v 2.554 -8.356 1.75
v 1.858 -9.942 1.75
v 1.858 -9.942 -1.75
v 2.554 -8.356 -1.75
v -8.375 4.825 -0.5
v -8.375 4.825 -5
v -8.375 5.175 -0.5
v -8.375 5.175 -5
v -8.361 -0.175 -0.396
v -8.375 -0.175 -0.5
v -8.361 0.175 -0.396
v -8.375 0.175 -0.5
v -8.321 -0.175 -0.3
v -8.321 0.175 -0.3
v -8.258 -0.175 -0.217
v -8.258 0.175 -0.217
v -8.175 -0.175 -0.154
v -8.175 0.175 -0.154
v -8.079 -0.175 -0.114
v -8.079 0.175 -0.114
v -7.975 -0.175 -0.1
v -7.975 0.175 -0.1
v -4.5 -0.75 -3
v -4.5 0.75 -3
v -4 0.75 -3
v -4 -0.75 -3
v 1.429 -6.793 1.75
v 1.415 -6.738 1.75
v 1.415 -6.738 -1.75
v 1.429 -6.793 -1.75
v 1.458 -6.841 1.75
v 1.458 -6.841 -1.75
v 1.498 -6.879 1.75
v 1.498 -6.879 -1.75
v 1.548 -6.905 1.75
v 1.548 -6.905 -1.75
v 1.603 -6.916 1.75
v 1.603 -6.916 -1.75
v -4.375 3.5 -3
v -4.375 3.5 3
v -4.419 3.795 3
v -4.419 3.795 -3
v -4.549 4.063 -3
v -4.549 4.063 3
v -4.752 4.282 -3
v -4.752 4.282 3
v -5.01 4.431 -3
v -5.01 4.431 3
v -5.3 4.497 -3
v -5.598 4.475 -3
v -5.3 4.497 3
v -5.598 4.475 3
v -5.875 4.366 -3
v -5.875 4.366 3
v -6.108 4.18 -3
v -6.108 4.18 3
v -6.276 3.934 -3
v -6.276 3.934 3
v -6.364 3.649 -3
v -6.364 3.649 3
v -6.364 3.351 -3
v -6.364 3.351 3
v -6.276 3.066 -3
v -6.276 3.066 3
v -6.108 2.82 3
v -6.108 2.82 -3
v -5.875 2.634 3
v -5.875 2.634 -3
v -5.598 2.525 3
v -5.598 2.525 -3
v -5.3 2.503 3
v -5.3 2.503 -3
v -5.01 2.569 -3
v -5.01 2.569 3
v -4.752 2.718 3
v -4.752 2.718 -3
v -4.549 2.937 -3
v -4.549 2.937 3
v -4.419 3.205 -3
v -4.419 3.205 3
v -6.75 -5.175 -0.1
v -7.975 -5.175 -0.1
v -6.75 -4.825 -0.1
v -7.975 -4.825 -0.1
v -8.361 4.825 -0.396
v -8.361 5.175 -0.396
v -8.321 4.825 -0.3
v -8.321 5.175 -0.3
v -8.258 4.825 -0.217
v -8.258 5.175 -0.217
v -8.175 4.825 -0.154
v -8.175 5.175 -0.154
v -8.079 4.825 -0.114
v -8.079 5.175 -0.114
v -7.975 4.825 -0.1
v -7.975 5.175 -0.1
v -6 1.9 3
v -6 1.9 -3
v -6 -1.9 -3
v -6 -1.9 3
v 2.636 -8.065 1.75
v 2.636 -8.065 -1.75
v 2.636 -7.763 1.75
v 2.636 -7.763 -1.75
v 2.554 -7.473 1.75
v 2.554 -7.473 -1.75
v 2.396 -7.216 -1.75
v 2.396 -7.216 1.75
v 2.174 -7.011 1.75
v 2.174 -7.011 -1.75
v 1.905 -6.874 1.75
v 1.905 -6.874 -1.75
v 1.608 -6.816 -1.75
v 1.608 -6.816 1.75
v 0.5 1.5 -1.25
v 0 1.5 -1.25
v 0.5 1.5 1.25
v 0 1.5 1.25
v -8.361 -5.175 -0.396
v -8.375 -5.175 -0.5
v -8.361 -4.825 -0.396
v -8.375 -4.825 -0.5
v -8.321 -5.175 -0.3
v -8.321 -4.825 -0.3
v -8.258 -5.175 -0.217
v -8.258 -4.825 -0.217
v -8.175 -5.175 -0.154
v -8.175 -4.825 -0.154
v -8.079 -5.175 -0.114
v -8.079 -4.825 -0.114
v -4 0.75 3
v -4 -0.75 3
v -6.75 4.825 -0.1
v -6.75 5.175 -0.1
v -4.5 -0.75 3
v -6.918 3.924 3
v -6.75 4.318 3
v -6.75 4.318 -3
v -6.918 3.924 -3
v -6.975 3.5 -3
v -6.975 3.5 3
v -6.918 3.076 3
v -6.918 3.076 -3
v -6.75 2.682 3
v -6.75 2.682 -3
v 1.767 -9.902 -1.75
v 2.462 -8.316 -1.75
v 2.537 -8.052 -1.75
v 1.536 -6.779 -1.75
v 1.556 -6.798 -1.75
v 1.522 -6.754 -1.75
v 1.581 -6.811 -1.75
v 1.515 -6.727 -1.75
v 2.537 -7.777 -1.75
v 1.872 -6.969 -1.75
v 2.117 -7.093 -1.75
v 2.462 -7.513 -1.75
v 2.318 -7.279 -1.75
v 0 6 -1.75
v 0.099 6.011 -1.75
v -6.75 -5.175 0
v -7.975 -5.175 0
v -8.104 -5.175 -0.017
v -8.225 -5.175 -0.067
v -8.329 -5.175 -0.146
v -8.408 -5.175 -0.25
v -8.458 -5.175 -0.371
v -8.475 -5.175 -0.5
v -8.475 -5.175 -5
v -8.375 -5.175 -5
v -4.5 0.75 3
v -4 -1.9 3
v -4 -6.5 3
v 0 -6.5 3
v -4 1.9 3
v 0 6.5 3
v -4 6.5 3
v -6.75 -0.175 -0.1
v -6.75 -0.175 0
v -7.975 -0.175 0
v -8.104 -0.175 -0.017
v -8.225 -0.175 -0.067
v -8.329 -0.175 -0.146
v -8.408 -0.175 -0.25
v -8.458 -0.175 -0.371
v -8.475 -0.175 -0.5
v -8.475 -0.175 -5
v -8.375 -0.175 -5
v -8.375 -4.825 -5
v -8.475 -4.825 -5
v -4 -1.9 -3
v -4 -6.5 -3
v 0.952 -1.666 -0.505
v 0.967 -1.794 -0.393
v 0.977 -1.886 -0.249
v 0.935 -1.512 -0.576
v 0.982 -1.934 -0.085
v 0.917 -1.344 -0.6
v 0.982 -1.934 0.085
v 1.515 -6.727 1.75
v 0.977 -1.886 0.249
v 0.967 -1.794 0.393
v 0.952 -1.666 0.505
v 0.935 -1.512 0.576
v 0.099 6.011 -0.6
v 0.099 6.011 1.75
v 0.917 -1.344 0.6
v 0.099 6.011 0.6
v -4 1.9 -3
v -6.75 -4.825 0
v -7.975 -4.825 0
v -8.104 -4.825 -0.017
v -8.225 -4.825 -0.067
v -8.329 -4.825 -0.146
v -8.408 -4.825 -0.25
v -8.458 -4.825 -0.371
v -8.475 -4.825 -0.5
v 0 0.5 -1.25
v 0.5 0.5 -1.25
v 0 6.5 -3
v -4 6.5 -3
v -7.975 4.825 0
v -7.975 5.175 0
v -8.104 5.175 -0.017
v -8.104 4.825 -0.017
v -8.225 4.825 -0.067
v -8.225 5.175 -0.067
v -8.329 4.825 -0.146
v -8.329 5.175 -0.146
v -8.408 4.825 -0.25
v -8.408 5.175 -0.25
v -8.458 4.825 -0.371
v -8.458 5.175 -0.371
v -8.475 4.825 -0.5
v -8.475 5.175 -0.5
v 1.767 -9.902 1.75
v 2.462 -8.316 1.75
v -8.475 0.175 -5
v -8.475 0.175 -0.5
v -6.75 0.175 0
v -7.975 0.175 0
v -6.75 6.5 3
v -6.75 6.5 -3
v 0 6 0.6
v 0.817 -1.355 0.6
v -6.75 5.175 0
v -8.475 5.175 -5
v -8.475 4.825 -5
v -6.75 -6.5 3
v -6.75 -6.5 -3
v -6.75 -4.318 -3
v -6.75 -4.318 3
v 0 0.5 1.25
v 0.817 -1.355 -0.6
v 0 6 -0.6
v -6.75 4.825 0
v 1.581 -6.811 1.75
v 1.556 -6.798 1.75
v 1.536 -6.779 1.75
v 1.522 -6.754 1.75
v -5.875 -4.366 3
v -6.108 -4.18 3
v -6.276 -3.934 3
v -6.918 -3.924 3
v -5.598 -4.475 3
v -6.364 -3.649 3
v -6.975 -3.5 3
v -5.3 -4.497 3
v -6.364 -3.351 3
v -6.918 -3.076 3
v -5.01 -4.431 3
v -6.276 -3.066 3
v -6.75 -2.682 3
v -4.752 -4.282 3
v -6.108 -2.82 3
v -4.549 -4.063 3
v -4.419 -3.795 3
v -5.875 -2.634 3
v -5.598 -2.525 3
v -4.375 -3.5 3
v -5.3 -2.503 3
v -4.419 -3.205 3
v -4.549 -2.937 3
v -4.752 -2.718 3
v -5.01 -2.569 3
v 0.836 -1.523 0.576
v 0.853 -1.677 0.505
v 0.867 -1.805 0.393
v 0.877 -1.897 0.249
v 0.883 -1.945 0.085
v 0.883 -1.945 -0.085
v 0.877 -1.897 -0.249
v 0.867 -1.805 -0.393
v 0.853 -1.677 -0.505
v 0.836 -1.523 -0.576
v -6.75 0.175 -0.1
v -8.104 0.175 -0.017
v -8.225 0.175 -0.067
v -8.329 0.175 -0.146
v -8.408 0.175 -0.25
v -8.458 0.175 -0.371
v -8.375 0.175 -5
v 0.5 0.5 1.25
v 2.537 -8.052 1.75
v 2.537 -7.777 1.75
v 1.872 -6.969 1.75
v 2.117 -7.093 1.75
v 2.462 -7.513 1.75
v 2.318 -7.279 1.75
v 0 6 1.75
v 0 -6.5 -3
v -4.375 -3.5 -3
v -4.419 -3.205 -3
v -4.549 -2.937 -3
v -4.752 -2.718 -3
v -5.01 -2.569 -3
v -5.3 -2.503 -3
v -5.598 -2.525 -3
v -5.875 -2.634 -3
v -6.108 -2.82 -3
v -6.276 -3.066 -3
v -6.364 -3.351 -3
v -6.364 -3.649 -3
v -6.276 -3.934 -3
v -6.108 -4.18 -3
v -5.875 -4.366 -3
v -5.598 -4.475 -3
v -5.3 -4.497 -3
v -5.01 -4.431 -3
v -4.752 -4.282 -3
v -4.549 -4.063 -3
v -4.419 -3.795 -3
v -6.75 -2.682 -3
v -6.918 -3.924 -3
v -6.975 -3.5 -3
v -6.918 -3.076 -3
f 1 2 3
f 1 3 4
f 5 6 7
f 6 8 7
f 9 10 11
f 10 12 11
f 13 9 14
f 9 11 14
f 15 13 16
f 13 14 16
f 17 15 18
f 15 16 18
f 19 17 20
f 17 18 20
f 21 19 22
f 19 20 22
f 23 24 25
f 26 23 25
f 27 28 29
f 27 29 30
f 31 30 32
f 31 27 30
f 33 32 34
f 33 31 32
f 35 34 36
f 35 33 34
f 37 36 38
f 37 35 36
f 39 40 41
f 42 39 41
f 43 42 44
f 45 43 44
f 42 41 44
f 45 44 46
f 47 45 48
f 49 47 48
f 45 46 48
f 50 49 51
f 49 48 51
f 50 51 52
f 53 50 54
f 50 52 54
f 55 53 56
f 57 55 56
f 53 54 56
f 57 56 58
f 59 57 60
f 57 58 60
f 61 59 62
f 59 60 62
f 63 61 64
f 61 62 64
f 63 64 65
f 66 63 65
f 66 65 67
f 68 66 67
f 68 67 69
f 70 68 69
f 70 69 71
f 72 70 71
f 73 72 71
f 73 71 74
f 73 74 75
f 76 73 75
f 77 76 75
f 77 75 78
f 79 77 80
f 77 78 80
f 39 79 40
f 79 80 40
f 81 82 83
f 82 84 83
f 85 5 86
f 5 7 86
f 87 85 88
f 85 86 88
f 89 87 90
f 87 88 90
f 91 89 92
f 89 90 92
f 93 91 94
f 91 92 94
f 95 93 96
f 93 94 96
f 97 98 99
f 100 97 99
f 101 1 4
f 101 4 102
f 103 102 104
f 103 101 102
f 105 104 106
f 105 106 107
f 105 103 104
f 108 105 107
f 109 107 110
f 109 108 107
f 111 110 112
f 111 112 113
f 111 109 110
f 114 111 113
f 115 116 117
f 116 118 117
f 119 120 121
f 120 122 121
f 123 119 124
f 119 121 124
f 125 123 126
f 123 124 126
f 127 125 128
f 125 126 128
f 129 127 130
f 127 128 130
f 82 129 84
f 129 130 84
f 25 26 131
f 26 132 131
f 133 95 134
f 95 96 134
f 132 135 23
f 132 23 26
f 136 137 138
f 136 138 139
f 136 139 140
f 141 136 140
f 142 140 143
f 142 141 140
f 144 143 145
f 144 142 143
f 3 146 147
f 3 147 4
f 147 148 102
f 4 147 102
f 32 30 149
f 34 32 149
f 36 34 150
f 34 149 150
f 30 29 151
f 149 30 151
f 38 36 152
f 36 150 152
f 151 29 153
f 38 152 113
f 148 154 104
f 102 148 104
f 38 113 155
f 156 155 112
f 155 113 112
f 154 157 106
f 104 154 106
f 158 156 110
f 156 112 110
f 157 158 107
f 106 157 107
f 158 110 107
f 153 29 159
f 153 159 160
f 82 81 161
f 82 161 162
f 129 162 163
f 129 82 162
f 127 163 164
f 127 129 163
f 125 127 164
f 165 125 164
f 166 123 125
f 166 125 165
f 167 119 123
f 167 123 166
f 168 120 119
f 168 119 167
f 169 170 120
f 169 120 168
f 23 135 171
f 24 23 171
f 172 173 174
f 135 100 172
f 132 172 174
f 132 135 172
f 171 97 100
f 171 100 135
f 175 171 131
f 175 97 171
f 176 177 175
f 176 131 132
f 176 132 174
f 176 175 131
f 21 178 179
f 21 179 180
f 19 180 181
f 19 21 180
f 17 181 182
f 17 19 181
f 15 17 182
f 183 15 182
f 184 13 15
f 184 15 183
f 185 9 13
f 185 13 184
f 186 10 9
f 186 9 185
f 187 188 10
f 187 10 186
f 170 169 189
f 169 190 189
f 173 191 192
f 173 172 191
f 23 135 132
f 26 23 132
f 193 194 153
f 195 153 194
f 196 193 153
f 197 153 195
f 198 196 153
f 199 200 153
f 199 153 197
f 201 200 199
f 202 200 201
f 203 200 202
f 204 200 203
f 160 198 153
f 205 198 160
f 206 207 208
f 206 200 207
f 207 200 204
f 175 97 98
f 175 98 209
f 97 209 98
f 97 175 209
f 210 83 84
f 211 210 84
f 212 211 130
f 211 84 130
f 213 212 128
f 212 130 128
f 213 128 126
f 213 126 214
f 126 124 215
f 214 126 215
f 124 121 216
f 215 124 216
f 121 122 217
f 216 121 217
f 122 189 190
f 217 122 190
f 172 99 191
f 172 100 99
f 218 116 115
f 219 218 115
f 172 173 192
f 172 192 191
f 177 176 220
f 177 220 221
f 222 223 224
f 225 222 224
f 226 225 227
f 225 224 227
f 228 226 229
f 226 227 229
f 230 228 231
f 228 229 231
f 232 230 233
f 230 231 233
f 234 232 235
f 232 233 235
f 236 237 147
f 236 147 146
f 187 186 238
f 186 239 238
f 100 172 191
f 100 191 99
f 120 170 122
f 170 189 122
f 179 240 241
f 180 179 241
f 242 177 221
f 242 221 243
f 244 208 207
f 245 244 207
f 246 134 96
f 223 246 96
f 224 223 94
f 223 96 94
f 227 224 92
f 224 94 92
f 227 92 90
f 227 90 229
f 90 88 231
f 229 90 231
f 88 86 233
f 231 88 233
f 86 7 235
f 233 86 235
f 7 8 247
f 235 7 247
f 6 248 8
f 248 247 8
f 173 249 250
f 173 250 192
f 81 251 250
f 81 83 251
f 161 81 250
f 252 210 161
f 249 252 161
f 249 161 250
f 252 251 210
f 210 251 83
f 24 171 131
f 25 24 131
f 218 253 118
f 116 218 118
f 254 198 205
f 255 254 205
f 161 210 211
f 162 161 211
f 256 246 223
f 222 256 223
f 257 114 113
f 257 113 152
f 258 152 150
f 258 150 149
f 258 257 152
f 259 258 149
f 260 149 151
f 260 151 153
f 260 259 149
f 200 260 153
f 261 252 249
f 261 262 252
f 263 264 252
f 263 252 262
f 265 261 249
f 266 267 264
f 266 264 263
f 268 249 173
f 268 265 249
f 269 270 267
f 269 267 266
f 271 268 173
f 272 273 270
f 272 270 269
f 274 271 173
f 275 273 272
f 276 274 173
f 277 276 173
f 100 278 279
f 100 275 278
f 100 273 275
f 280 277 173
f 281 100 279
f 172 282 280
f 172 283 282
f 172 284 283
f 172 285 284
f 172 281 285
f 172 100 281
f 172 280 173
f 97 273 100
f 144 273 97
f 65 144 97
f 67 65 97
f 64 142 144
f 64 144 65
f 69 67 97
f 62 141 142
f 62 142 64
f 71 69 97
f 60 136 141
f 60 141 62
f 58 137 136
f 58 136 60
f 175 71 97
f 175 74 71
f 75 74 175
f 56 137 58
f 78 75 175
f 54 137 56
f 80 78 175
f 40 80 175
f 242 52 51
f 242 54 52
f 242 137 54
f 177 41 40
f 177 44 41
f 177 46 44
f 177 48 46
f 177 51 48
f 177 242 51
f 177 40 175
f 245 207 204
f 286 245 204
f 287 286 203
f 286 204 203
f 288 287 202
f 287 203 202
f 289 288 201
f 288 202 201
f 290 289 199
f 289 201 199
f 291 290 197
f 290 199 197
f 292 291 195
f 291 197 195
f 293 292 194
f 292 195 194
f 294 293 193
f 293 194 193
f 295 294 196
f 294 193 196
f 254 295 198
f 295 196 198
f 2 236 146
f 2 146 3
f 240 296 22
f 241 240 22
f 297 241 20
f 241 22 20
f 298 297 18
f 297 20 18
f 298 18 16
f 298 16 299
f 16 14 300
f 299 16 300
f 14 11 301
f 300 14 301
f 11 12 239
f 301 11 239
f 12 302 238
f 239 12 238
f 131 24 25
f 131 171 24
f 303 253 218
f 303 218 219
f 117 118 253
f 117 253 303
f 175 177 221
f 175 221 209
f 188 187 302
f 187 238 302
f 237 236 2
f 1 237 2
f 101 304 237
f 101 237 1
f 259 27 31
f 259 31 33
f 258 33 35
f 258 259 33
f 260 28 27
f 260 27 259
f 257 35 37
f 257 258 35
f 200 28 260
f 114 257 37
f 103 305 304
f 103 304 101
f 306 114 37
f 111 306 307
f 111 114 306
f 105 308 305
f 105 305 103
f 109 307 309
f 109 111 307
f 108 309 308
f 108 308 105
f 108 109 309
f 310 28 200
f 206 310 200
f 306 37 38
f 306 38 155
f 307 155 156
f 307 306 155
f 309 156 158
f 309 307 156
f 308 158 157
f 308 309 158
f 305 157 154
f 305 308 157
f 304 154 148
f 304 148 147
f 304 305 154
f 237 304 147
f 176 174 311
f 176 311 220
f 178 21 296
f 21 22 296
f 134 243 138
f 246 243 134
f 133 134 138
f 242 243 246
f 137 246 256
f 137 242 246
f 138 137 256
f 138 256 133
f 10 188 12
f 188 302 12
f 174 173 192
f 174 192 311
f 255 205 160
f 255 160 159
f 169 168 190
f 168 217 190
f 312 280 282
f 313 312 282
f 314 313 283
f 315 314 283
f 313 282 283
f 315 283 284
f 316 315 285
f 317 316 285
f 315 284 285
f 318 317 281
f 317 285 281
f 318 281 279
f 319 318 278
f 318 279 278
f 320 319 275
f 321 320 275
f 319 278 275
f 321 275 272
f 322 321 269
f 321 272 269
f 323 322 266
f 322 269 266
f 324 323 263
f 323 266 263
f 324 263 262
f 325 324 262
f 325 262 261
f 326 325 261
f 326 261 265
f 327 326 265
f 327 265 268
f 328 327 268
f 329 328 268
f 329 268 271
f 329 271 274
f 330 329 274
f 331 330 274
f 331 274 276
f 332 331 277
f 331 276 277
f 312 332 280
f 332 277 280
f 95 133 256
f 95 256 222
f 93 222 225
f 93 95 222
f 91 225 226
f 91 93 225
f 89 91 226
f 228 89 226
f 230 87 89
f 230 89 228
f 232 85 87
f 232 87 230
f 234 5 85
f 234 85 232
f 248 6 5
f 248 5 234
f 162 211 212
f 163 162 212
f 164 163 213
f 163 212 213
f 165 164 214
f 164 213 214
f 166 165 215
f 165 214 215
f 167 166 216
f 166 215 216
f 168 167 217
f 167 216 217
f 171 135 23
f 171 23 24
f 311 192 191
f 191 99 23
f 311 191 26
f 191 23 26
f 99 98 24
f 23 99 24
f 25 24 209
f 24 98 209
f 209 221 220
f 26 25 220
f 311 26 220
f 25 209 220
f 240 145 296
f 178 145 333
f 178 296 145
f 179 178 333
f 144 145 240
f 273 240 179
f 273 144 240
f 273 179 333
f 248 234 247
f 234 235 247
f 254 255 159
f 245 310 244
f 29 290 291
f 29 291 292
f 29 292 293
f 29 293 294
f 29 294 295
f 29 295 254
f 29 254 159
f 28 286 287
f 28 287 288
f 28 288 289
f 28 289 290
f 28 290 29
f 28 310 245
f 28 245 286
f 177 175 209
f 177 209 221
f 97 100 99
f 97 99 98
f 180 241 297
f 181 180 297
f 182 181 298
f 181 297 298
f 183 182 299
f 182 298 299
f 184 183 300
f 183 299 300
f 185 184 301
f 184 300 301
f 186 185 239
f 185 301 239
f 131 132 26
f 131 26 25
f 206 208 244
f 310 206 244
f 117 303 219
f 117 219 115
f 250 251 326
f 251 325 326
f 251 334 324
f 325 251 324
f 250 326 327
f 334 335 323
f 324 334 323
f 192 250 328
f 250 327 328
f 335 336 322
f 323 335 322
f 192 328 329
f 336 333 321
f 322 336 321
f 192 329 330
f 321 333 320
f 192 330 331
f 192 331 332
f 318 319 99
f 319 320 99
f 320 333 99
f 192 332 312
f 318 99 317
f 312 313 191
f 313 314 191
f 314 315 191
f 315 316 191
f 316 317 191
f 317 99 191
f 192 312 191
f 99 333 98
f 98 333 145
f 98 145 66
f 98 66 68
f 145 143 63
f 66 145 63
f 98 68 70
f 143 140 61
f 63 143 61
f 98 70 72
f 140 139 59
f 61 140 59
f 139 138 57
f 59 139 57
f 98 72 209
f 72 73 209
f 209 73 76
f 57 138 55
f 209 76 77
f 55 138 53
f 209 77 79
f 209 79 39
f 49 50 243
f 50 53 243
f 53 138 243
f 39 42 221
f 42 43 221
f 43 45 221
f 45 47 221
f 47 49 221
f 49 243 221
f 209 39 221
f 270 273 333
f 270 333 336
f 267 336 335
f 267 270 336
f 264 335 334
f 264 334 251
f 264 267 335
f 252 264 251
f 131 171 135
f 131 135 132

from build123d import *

# Parameters (mm, degrees)
ESQUISSE1_W                    = 0.5
ESQUISSE1_H                    = 1.5
BOSS_EXTRU_1_DEPTH             = 3
ESQUISSE2_R                    = 1
BOSS_EXTRU_2_DEPTH             = 6
ESQUISSE2_W                    = 0.5
ESQUISSE2_H                    = 1.5
BOSS_EXTRU_2_2_DEPTH           = 6
ESQUISSE3_W                    = 0.5
ESQUISSE3_H                    = 1
BOSS_EXTRU_3_DEPTH             = 1.25
BOSS_EXTRU_4_DEPTH             = 1.75
ENL_V_MAT_EXTRU_1_DEPTH        = 0.1
BOSS_EXTRU_5_DEPTH             = 0.175
R_P_TITION_LIN_AIRE1_COUNT     = 2
R_P_TITION_LIN_AIRE1_PITCH     = 5
R_P_TITION_LIN_AIRE1_COL_COUNT = 2
R_P_TITION_LIN_AIRE1_COL_PITCH = 5


with BuildPart() as part:
    # Esquisse1 → Boss.-Extru.1 (new, symmetric)
    with BuildSketch(Plane.XY):
        Polygon((-4, -1.9), (-4, -6.5), (0, -6.5), (0, 6.5), (-4, 6.5), (-4, 1.9), (-6, 1.9), (-6, -1.9), align=None)
        with Locations((-4.25, 0)):
            Rectangle(ESQUISSE1_W, ESQUISSE1_H, mode=Mode.SUBTRACT)
    extrude(amount=BOSS_EXTRU_1_DEPTH, both=True)


with BuildPart() as body_2:
    # Esquisse2 → Boss.-Extru.2 (new body)
    with BuildSketch(Plane.XY.offset(3)):
        with BuildLine():
            Line((-4, 6.5), (-6.75, 6.5))
            Line((-6.75, 6.5), (-6.75, 4.318153409))
            ThreePointArc((-6.75, 4.318153409), (-6.975, 3.5), (-6.75, 2.681846591))
            Line((-6.75, 2.681846591), (-6.75, -2.681846591))
            ThreePointArc((-6.75, -2.681846591), (-6.975, -3.5), (-6.75, -4.318153409))
            Line((-6.75, -4.318153409), (-6.75, -6.5))
            Line((-6.75, -6.5), (-4, -6.5))
            Line((-4, -6.5), (-4, -1.9))
            Line((-4, -1.9), (-6, -1.9))
            Line((-6, -1.9), (-6, 1.9))
            Line((-6, 1.9), (-4, 1.9))
            Line((-4, 1.9), (-4, 6.5))
        make_face()
        with Locations((-5.375, 3.5)):
            Circle(ESQUISSE2_R, mode=Mode.SUBTRACT)
        with Locations((-5.375, -3.5)):
            Circle(ESQUISSE2_R, mode=Mode.SUBTRACT)
    extrude(amount=-BOSS_EXTRU_2_DEPTH)


with BuildPart() as body_3:
    # Esquisse2 → Boss.-Extru.2 2 (new body)
    with BuildSketch(Plane.XY.offset(3)):
        with Locations((-4.25, 0)):
            Rectangle(ESQUISSE2_W, ESQUISSE2_H)
    extrude(amount=-BOSS_EXTRU_2_2_DEPTH)


with BuildPart() as body_4:
    # Esquisse3 → Boss.-Extru.3 (new, symmetric)
    with BuildSketch(Plane.XY):
        with Locations((0.25, 1)):
            Rectangle(ESQUISSE3_W, ESQUISSE3_H)
    extrude(amount=BOSS_EXTRU_3_DEPTH, both=True)


with BuildPart() as body_5:
    # Esquisse4 → Boss.-Extru.4 (new, symmetric)
    with BuildSketch(Plane.XY):
        with BuildLine():
            Line((0, 6), (1.415377021, -6.738393192))
            ThreePointArc((1.415377021, -6.738393192), (1.476592169, -6.861485419), (1.602801701, -6.915984453))
            ThreePointArc((1.602801701, -6.915984453), (2.398287719, -7.391231624), (2.461985691, -8.315677646))
            Line((2.461985691, -8.315677646), (1.766904417, -9.902139755))
            Line((1.766904417, -9.902139755), (1.85849885, -9.942270291))
            Line((1.85849885, -9.942270291), (2.553580123, -8.355808182))
            ThreePointArc((2.553580123, -8.355808182), (2.483512355, -7.338917558), (1.608477735, -6.81614567))
            ThreePointArc((1.608477735, -6.81614567), (1.545372968, -6.788896153), (1.514765395, -6.727350039))
            Line((1.514765395, -6.727350039), (0.099388373, 6.011043153))
            Line((0.099388373, 6.011043153), (0, 6))
        make_face()
    extrude(amount=BOSS_EXTRU_4_DEPTH, both=True)

    # Esquisse5 → Enlèv. mat.-Extru.1 (cut)
    with BuildSketch(Plane(origin=(0.757924959, 0.084213884, 0), x_dir=(0, 0, -1), z_dir=(0.9938837346736189, 0.11043152607484652, 0))):
        with BuildLine():
            Line((-0.6, 5.963302408), (-0.6, -1.436697592))
            ThreePointArc((-0.6, -1.436697592), (0, -2.036697592), (0.6, -1.436697592))
            Line((0.6, -1.436697592), (0.6, 5.963302408))
            Line((0.6, 5.963302408), (-0.6, 5.963302408))
        make_face()
    extrude(amount=-ENL_V_MAT_EXTRU_1_DEPTH, mode=Mode.SUBTRACT)


with BuildPart() as body_6:
    # Esquisse6 → Boss.-Extru.5 (new, symmetric)
    with BuildSketch(Plane(origin=(0, 0, 0), x_dir=(1, 0, 0), z_dir=(0, 1, 0))):
        with BuildLine():
            Line((-6.975, 0), (-7.975, 0))
            ThreePointArc((-7.975, 0), (-8.328553391, 0.146446609), (-8.475, 0.5))
            Line((-8.475, 0.5), (-8.475, 5))
            Line((-8.475, 5), (-8.375, 5))
            Line((-8.375, 5), (-8.375, 0.5))
            ThreePointArc((-8.375, 0.5), (-8.257842712, 0.217157288), (-7.975, 0.1))
            Line((-7.975, 0.1), (-6.975, 0.1))
            Line((-6.975, 0.1), (-6.75, 0.1))
            Line((-6.75, 0.1), (-6.75, 0))
            Line((-6.75, 0), (-6.975, 0))
        make_face()
    boss_extru_5 = extrude(amount=BOSS_EXTRU_5_DEPTH, both=True)


with BuildPart() as body_2_1:
    add(body_2.part)

    # Répétition linéaire1: Boss.-Extru.5 ×2
    with Locations(*[(0, -i * R_P_TITION_LIN_AIRE1_PITCH, 0) for i in range(1, R_P_TITION_LIN_AIRE1_COUNT)]):
        add(boss_extru_5)

    # Répétition linéaire1 col: Boss.-Extru.5 ×2
    with Locations(*[(0, i * R_P_TITION_LIN_AIRE1_COL_PITCH, 0) for i in range(1, R_P_TITION_LIN_AIRE1_COL_COUNT)]):
        add(boss_extru_5)

    # Répétition linéaire1 col and its seed as: union body 6
    add(body_6.part)


solid = Compound([part.part, body_3.part, body_4.part, body_5.part, body_2_1.part])
